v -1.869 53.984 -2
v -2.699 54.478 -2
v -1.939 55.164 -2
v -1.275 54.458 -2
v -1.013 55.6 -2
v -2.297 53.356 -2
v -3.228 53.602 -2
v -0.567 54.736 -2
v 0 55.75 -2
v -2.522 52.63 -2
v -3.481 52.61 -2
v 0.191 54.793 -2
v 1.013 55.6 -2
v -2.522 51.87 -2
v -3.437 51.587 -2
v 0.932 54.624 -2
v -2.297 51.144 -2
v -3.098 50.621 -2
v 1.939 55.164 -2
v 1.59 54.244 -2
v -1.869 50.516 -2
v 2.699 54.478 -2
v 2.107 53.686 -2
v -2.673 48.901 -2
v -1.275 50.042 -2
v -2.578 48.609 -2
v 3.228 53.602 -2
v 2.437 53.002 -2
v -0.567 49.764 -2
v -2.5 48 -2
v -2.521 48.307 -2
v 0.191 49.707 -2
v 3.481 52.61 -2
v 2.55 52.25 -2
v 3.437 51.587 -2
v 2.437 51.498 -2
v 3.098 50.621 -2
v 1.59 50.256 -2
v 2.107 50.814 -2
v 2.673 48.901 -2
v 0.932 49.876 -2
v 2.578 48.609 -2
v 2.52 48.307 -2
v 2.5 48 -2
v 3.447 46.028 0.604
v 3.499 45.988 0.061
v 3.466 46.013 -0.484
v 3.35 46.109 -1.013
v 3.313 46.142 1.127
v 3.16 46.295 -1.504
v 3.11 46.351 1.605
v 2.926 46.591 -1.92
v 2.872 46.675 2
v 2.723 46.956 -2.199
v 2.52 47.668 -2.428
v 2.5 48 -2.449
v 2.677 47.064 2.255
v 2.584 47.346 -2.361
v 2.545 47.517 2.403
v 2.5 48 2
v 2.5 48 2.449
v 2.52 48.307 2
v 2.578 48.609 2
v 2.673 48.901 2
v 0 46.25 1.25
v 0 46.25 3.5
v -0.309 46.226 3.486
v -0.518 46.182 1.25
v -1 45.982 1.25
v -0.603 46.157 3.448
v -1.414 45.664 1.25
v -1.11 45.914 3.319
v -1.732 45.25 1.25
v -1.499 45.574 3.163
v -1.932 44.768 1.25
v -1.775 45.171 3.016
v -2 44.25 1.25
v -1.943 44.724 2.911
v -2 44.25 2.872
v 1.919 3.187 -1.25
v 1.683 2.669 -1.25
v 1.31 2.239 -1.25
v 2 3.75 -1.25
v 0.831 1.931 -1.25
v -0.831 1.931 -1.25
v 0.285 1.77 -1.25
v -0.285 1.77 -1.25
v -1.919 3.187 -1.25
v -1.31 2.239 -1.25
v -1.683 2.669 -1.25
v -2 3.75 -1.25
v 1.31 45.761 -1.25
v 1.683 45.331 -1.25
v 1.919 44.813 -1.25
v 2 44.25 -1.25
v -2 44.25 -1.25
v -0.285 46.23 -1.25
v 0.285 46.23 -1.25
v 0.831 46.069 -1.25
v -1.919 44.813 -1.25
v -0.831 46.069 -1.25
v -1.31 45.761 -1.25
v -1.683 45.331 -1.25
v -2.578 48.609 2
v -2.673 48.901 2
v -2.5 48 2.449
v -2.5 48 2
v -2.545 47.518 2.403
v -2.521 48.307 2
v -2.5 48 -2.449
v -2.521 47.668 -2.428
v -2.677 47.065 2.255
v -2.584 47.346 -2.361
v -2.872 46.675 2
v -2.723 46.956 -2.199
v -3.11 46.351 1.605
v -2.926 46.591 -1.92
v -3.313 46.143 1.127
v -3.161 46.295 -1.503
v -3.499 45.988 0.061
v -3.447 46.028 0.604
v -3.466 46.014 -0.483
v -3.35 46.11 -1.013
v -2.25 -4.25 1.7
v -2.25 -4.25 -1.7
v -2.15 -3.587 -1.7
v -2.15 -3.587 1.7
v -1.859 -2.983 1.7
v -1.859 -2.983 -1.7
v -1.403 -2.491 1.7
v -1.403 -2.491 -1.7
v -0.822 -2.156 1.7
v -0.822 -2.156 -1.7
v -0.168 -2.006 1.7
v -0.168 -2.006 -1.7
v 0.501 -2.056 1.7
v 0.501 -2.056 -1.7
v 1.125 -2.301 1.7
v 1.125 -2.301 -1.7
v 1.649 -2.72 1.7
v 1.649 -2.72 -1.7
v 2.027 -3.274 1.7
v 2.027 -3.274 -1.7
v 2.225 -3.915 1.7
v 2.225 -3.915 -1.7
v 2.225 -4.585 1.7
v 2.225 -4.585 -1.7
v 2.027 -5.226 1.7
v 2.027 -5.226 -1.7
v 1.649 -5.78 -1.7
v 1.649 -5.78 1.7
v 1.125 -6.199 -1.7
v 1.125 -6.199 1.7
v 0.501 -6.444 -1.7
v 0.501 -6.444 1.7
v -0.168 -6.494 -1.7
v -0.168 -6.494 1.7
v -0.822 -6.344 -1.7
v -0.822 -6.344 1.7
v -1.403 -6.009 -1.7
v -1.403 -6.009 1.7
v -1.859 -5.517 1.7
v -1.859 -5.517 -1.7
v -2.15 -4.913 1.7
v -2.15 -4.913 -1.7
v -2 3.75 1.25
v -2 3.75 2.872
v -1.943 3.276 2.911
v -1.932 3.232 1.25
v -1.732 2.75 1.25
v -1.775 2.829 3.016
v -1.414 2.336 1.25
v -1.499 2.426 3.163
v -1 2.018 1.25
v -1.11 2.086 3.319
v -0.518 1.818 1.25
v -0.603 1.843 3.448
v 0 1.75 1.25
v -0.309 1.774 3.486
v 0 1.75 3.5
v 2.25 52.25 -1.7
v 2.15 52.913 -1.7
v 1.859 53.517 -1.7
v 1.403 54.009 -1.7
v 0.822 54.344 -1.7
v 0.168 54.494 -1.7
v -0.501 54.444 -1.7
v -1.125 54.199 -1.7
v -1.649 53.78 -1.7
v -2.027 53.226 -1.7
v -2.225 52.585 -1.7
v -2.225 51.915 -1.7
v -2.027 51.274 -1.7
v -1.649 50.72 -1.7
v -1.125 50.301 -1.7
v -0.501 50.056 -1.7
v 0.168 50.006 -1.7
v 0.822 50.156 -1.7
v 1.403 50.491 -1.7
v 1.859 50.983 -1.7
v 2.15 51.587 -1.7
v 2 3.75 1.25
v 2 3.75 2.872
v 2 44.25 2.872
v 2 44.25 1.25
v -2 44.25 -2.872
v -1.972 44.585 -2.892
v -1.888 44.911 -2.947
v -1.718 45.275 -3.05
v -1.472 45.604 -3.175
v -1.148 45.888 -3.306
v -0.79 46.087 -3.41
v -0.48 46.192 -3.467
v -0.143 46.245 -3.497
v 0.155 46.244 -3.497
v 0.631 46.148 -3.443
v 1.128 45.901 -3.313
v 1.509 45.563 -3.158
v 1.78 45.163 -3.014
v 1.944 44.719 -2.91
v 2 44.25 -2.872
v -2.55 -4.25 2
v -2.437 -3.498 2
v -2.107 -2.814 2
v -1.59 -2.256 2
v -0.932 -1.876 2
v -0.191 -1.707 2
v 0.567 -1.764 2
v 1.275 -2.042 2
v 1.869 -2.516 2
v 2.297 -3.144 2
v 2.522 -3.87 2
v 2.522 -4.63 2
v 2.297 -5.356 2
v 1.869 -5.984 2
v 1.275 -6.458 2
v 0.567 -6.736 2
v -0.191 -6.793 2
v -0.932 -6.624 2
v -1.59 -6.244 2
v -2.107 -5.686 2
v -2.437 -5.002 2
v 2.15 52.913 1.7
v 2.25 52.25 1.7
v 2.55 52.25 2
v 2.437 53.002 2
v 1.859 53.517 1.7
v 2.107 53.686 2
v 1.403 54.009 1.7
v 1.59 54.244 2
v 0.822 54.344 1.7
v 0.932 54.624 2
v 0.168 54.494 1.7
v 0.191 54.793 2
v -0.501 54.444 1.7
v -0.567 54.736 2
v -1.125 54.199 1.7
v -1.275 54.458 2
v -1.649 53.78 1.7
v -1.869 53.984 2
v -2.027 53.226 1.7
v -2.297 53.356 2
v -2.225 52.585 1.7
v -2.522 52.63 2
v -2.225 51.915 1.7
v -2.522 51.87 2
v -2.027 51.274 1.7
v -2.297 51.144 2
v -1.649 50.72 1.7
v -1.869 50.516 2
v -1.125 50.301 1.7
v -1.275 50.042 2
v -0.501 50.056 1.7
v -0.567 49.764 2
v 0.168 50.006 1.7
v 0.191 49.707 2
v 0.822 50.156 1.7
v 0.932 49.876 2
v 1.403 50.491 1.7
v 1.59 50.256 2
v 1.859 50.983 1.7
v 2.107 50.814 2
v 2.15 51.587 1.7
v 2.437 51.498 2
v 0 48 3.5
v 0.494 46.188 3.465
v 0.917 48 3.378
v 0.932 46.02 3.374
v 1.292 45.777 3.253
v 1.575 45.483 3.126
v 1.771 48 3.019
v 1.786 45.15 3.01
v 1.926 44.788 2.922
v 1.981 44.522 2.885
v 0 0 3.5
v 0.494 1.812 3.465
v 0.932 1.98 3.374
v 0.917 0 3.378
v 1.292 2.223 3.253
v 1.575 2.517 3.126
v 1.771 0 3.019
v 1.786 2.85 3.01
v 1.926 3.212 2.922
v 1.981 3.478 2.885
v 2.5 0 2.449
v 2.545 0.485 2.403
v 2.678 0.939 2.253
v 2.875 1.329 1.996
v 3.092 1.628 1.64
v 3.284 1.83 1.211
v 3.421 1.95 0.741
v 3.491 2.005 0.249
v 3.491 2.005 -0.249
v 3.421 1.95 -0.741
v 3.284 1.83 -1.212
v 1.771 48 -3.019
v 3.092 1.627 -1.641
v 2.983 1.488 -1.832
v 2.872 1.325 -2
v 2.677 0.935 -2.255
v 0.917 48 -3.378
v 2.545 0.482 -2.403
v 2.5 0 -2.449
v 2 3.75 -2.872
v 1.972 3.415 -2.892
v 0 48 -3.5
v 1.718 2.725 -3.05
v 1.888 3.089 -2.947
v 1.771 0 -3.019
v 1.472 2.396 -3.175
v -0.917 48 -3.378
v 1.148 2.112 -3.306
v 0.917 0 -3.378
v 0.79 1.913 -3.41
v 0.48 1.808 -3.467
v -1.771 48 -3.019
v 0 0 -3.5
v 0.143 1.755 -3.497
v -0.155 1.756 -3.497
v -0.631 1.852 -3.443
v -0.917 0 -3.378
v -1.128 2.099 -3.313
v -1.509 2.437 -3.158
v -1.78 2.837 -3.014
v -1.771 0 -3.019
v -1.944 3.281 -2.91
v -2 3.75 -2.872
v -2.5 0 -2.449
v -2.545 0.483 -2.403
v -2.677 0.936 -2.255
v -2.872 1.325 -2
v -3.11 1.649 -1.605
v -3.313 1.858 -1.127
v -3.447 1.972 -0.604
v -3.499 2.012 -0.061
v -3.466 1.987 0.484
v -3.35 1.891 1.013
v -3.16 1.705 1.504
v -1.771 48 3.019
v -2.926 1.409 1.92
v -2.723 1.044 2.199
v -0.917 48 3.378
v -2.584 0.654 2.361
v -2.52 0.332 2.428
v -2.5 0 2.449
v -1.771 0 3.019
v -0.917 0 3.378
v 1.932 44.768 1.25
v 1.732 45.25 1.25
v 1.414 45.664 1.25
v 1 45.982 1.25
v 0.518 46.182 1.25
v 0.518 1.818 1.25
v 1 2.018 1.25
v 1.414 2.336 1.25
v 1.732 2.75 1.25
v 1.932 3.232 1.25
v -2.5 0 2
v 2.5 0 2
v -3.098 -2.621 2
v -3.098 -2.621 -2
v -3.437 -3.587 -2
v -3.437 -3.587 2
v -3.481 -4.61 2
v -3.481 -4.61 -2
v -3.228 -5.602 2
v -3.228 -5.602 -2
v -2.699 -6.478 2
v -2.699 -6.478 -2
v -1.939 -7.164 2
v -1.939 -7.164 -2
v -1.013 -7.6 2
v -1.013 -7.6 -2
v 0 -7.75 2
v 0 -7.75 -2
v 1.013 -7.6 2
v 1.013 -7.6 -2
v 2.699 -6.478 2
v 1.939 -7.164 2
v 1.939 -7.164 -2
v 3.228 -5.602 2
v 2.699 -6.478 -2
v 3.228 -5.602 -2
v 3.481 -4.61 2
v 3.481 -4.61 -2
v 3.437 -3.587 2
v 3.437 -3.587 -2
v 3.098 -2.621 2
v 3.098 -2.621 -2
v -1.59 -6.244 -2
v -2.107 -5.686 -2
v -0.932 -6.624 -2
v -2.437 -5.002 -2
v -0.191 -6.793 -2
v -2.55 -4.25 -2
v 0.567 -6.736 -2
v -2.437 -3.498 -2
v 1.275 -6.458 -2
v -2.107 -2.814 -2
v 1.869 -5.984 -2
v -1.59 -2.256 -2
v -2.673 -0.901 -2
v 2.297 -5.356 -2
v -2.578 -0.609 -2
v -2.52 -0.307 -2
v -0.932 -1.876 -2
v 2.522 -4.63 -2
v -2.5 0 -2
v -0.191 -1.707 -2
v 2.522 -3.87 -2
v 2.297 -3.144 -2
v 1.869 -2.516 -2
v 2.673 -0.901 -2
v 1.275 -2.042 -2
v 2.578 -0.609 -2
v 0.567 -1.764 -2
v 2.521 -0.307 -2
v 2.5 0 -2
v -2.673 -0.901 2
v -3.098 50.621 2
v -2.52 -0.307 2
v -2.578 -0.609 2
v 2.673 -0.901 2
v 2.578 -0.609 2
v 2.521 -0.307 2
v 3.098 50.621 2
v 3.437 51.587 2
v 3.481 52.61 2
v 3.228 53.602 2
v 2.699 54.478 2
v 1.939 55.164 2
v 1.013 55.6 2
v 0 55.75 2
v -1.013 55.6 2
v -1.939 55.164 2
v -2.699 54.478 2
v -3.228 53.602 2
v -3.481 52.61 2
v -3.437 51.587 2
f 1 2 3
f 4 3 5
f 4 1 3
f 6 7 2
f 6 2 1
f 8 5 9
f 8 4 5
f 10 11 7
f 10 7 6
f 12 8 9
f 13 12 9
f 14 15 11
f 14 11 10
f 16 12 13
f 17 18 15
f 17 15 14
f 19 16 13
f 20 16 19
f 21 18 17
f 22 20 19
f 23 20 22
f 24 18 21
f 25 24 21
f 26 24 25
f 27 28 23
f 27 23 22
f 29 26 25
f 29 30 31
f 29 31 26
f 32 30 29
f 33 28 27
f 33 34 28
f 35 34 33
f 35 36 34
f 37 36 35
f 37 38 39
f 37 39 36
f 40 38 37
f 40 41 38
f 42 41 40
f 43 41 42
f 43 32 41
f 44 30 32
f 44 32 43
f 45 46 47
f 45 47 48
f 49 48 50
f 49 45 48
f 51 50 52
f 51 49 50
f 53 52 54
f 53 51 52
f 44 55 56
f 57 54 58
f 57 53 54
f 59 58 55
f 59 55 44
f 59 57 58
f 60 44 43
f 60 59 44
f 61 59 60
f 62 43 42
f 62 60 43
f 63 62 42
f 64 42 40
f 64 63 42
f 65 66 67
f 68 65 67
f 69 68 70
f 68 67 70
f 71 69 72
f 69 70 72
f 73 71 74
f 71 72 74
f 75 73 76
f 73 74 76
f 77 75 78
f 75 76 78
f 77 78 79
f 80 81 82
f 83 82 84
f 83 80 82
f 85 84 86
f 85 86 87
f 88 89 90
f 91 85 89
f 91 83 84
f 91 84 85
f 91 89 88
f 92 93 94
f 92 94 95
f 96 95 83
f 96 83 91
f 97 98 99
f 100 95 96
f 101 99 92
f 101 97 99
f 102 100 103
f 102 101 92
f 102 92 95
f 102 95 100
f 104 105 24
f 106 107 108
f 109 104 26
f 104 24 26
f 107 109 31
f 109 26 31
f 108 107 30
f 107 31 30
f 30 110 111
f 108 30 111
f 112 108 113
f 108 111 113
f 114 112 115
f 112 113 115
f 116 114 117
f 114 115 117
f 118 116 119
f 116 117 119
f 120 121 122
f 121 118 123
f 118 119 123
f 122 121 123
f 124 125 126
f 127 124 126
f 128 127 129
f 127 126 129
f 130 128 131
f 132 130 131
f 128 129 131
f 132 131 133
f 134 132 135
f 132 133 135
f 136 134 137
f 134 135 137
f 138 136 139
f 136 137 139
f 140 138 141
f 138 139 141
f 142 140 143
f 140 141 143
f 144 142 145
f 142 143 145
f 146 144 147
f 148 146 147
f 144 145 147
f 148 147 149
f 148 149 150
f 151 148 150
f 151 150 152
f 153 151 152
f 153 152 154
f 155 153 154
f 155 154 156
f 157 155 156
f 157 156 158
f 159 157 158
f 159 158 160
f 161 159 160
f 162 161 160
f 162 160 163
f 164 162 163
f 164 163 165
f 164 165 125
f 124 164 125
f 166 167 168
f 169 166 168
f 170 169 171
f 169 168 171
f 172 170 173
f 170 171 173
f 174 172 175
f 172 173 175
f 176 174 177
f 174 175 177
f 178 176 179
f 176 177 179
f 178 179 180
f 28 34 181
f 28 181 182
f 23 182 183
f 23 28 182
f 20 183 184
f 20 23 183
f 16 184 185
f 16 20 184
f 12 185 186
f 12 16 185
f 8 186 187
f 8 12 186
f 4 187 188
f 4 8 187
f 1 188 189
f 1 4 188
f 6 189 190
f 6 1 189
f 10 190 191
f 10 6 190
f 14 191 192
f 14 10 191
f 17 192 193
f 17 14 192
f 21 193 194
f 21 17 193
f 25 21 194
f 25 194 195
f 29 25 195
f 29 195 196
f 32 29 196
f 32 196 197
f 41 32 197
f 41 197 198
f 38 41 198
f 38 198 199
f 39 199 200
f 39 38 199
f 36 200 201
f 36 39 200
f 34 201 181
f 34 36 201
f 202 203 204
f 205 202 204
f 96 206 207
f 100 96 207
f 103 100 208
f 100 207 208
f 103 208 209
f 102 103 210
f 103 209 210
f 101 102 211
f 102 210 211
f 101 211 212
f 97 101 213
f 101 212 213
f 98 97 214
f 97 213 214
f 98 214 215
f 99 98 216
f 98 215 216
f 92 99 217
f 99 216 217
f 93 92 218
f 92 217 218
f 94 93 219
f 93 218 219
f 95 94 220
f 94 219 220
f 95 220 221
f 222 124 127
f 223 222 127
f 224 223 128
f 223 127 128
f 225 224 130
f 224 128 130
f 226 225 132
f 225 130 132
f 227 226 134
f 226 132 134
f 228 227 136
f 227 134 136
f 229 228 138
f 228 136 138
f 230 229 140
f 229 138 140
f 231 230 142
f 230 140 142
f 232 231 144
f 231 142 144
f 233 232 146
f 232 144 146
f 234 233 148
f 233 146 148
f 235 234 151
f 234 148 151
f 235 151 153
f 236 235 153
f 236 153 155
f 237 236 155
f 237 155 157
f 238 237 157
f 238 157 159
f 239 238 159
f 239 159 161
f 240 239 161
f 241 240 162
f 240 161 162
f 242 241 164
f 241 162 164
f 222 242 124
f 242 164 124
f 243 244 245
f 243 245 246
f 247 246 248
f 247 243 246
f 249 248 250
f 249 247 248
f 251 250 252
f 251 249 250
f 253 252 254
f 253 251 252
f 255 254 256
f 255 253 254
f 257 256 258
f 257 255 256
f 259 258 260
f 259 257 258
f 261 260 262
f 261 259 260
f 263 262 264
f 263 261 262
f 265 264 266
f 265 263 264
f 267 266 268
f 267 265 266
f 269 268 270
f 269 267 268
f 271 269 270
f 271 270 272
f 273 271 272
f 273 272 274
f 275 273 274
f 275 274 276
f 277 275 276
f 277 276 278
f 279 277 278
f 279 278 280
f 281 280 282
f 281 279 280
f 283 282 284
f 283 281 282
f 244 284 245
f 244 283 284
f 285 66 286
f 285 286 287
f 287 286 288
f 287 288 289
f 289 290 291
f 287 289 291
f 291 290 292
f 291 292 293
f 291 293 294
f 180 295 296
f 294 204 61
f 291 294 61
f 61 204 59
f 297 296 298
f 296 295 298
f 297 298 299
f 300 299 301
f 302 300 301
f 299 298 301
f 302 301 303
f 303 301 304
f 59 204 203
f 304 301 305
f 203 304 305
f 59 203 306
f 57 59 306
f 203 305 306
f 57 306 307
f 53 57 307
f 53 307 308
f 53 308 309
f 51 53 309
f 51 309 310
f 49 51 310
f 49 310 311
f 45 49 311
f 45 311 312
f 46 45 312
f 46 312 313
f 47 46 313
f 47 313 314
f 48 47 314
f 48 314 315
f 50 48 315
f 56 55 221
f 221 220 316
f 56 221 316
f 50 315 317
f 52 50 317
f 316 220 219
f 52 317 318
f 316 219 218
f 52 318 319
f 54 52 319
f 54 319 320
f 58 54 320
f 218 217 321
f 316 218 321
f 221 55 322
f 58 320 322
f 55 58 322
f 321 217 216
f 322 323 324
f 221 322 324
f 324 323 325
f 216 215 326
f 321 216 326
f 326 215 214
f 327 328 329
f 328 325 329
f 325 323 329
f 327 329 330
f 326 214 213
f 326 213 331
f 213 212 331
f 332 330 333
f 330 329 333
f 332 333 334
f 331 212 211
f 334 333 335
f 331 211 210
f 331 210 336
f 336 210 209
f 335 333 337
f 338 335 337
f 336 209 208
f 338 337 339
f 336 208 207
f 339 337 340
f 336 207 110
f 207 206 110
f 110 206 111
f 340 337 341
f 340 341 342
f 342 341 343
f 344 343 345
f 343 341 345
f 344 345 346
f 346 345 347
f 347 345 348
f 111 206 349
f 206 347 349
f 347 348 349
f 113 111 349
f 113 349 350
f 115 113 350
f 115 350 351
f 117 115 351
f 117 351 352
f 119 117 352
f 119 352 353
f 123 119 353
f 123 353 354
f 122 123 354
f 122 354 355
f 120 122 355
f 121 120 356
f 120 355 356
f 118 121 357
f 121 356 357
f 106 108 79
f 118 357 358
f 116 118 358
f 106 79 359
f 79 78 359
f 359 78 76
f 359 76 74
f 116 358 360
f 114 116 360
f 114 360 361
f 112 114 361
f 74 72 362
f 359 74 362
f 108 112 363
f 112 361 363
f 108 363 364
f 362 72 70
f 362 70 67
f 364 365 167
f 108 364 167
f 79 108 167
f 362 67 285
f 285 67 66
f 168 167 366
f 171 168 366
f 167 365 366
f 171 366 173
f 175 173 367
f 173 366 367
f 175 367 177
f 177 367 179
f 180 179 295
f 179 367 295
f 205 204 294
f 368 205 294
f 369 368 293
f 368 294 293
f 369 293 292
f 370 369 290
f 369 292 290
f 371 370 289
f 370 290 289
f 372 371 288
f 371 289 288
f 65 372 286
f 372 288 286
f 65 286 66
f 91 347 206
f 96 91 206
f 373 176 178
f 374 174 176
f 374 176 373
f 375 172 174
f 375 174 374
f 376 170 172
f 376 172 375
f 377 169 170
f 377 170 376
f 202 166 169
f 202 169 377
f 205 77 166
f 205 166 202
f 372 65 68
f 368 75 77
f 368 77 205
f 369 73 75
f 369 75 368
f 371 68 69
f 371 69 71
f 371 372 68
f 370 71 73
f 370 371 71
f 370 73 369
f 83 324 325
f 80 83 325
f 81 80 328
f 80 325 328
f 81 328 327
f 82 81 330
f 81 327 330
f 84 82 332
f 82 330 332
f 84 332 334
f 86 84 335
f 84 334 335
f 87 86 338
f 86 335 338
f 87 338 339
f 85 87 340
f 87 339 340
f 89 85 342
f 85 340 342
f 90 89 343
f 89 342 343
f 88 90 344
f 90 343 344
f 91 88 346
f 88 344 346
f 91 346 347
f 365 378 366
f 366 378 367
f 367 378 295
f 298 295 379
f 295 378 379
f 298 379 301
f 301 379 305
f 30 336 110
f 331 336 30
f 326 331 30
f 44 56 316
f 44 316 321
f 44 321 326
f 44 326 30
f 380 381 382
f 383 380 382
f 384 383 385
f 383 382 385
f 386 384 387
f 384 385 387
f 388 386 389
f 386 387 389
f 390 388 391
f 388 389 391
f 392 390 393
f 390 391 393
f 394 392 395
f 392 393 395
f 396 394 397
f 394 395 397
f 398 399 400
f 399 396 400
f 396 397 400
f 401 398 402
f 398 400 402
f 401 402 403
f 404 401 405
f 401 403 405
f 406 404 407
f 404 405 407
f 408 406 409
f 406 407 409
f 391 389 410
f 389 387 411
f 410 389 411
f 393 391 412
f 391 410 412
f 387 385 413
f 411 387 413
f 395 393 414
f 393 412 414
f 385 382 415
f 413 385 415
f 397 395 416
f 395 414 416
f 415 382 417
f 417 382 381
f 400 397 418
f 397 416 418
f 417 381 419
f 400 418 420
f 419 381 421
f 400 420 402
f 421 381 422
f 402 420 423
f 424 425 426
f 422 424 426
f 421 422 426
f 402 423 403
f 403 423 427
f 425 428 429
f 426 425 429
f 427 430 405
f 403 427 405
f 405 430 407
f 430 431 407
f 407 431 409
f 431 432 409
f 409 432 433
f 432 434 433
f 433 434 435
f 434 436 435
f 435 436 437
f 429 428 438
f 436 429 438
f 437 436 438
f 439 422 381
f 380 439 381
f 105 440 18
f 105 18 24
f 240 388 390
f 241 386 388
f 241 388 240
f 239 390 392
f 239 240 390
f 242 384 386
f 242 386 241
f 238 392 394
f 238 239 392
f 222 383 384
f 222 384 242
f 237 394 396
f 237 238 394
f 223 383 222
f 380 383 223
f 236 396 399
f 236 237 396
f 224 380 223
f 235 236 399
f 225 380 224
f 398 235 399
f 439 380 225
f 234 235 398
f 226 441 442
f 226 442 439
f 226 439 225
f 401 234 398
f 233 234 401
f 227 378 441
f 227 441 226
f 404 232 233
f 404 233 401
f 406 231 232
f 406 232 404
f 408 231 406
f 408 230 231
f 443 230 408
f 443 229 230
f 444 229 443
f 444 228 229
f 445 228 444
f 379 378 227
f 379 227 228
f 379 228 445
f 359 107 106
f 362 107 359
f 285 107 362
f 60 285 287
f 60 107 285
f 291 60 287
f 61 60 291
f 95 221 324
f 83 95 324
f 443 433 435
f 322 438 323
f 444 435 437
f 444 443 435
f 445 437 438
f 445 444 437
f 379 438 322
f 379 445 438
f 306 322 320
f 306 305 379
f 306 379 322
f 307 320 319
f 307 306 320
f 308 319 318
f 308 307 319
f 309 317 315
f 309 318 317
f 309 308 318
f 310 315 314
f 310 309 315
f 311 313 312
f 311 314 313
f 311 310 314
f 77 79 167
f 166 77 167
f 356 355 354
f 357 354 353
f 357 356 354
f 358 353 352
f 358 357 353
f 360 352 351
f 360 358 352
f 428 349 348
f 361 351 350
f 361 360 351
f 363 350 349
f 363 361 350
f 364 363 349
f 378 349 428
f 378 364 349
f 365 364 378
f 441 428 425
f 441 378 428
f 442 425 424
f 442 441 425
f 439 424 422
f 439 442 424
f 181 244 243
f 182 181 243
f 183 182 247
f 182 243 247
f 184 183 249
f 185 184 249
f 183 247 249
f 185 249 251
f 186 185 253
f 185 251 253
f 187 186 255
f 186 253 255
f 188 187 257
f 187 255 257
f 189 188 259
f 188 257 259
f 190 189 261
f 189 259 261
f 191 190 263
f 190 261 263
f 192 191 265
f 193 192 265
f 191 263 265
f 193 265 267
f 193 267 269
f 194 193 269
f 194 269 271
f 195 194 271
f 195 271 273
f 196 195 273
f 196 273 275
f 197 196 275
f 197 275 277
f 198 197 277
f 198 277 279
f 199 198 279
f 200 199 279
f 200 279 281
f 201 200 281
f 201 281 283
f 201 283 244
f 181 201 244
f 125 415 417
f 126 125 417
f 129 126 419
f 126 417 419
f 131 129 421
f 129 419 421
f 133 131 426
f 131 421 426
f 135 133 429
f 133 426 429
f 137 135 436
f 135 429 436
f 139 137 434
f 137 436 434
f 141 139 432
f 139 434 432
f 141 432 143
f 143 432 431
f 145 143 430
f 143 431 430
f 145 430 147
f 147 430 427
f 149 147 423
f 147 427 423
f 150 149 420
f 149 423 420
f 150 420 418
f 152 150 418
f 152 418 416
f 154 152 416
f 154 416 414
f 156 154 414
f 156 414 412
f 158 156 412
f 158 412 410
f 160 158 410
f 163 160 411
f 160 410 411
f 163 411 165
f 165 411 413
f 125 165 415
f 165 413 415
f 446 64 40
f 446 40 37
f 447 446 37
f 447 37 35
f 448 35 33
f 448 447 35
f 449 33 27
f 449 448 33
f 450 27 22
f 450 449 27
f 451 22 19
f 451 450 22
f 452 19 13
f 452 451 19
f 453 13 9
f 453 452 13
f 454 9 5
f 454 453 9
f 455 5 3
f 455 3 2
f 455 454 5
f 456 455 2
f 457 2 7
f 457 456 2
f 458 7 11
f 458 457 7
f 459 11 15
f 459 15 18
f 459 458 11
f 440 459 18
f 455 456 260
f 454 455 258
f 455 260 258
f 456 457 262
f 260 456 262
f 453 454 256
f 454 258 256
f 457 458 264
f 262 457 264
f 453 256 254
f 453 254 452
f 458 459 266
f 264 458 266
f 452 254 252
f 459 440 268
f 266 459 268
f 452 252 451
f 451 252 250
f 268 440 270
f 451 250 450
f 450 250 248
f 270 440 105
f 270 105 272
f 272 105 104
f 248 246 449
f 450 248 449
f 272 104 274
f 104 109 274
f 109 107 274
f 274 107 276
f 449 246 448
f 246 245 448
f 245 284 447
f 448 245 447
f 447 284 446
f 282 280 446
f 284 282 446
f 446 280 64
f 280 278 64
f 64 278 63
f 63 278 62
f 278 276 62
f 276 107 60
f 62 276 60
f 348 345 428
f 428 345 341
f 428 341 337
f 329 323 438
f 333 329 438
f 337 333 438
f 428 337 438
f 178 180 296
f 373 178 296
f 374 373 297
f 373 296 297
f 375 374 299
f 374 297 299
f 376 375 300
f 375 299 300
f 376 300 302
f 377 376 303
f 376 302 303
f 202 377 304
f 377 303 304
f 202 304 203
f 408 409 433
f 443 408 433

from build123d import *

# Parameters (mm, degrees)
SKETCH1_R           = 3.5
EXTRUDE1_DEPTH      = 48
SKETCH3_W           = 8
SKETCH3_H           = 4
EXTRUDE2_DEPTH      = 9
SKETCH4_R           = 2.25
EXTRUDE3_DEPTH      = 2.5
EXTRUDE3_DEPTH_BACK = 6.5
SKETCH5_W           = 8
SKETCH5_H           = 4
EXTRUDE4_DEPTH      = 10
SKETCH6_R           = 2.25
EXTRUDE9_DEPTH      = 2.5000001
EXTRUDE9_DEPTH_BACK = 6.5000001
EXTRUDE10_DEPTH     = 2.25
EXTRUDE11_DEPTH     = 2.25
CHAMFER1_SIZE       = 0.3


with BuildPart() as part:
    # Sketch1 → Extrude1 (new body)
    with BuildSketch(Plane(origin=(0, 0, 0), x_dir=(1, 0, 0), z_dir=(0, 1, 0))):
        with Locations(Location((0, 0, 0), (0, 0, 270))):  # turned: the seam where the file's is
            Circle(SKETCH1_R)
    extrude(amount=EXTRUDE1_DEPTH)

    # Sketch3 → Extrude2 (add)
    with BuildSketch(Plane(origin=(0, 48, 0), x_dir=(1, 0, 0), z_dir=(0, 1, 0))):
        Rectangle(SKETCH3_W, SKETCH3_H)
    extrude(amount=EXTRUDE2_DEPTH)

    # Sketch4 → Extrude3 (cut, two sides)
    with BuildSketch(Plane.XY.offset(2)) as extrude3_sk:
        with Locations((0, 52.25)):
            Circle(SKETCH4_R)
        with BuildLine():
            Line((-7.499970708, 47.987897931), (-8.595568017, 58.173135503))
            Line((-8.595568017, 58.173135503), (8.858273183, 57.495072607))
            Line((8.858273183, 57.495072607), (7.499969018, 47.987553821))
            ThreePointArc((7.499969018, 47.987553821), (4.534958441, 45.531181463), (2.672956888, 48.901345124))
            Line((2.672956888, 48.901345124), (3.097561986, 50.620549251))
            ThreePointArc((3.097561986, 50.620549251), (0, 55.75), (-3.097561986, 50.620549251))
            Line((-3.097561986, 50.620549251), (-2.672956888, 48.901345124))
            ThreePointArc((-2.672956888, 48.901345124), (-4.53465869, 45.531582657), (-7.499970708, 47.987897931))
        make_face()
    extrude(amount=EXTRUDE3_DEPTH, mode=Mode.SUBTRACT)
    extrude(extrude3_sk.sketch, amount=-EXTRUDE3_DEPTH_BACK, mode=Mode.SUBTRACT)

    # Sketch5 → Extrude4 (add)
    with BuildSketch(Plane.XZ):
        Rectangle(SKETCH5_W, SKETCH5_H)
    extrude(amount=EXTRUDE4_DEPTH)

    # Sketch6 → Extrude9 (cut, two sides)
    with BuildSketch(Plane(origin=(0, 0, -2), x_dir=(-1, 0, 0), z_dir=(0, 0, -1))) as extrude9_sk:
        with Locations((0, -4.25)):
            Circle(SKETCH6_R)
        with BuildLine():
            Line((-3.097561986, -2.620549251), (-2.672956888, -0.901345124))
            ThreePointArc((-2.672956888, -0.901345124), (-4.53465869, 2.468417343), (-7.499970708, 0.012102069))
            Line((-7.499970708, 0.012102069), (-8.700661362, -11.644211871))
            Line((-8.700661362, -11.644211871), (9.512578745, -12.130566681))
            Line((9.512578745, -12.130566681), (7.499969018, 0.012446179))
            ThreePointArc((7.499969018, 0.012446179), (4.534958441, 2.468818537), (2.672956888, -0.901345124))
            Line((2.672956888, -0.901345124), (3.097561986, -2.620549251))
            ThreePointArc((3.097561986, -2.620549251), (0, -7.75), (-3.097561986, -2.620549251))
        make_face()
    extrude(amount=EXTRUDE9_DEPTH, mode=Mode.SUBTRACT)
    extrude(extrude9_sk.sketch, amount=-EXTRUDE9_DEPTH_BACK, mode=Mode.SUBTRACT)

    # Sketch7 → Extrude10 (cut)
    with BuildSketch(Plane.XY.offset(3.5)):
        with BuildLine():
            ThreePointArc((0, 46.25), (-1.414213562, 45.664213562), (-2, 44.25))
            Line((-2, 44.25), (-2, 3.75))
            ThreePointArc((-2, 3.75), (-1.414213562, 2.335786438), (0, 1.75))
            ThreePointArc((0, 1.75), (1.414213562, 2.335786438), (2, 3.75))
            Line((2, 3.75), (2, 44.25))
            ThreePointArc((2, 44.25), (1.414213562, 45.664213562), (0, 46.25))
        make_face()
    extrude(amount=-EXTRUDE10_DEPTH, mode=Mode.SUBTRACT)

    # Sketch8 → Extrude11 (cut)
    with BuildSketch(Plane(origin=(0, 0, -3.5), x_dir=(-1, 0, 0), z_dir=(0, 0, -1))):
        with BuildLine():
            Line((-2, 44.25), (-2, 3.75))
            ThreePointArc((-2, 3.75), (0, 1.75), (2, 3.75))
            Line((2, 3.75), (2, 44.25))
            ThreePointArc((2, 44.25), (0, 46.25), (-2, 44.25))
        make_face()
    extrude(amount=-EXTRUDE11_DEPTH, mode=Mode.SUBTRACT)

    # Chamfer1
    chamfer1_edges = [part.edges().sort_by_distance(p)[0] for p in [
        (-2.25, 52.25, -2),
        (-2.25, 52.25, 2),
        (2.25, -4.25, -2),
        (2.25, -4.25, 2),
    ]]
    chamfer(chamfer1_edges, length=CHAMFER1_SIZE)


solid = part.part
